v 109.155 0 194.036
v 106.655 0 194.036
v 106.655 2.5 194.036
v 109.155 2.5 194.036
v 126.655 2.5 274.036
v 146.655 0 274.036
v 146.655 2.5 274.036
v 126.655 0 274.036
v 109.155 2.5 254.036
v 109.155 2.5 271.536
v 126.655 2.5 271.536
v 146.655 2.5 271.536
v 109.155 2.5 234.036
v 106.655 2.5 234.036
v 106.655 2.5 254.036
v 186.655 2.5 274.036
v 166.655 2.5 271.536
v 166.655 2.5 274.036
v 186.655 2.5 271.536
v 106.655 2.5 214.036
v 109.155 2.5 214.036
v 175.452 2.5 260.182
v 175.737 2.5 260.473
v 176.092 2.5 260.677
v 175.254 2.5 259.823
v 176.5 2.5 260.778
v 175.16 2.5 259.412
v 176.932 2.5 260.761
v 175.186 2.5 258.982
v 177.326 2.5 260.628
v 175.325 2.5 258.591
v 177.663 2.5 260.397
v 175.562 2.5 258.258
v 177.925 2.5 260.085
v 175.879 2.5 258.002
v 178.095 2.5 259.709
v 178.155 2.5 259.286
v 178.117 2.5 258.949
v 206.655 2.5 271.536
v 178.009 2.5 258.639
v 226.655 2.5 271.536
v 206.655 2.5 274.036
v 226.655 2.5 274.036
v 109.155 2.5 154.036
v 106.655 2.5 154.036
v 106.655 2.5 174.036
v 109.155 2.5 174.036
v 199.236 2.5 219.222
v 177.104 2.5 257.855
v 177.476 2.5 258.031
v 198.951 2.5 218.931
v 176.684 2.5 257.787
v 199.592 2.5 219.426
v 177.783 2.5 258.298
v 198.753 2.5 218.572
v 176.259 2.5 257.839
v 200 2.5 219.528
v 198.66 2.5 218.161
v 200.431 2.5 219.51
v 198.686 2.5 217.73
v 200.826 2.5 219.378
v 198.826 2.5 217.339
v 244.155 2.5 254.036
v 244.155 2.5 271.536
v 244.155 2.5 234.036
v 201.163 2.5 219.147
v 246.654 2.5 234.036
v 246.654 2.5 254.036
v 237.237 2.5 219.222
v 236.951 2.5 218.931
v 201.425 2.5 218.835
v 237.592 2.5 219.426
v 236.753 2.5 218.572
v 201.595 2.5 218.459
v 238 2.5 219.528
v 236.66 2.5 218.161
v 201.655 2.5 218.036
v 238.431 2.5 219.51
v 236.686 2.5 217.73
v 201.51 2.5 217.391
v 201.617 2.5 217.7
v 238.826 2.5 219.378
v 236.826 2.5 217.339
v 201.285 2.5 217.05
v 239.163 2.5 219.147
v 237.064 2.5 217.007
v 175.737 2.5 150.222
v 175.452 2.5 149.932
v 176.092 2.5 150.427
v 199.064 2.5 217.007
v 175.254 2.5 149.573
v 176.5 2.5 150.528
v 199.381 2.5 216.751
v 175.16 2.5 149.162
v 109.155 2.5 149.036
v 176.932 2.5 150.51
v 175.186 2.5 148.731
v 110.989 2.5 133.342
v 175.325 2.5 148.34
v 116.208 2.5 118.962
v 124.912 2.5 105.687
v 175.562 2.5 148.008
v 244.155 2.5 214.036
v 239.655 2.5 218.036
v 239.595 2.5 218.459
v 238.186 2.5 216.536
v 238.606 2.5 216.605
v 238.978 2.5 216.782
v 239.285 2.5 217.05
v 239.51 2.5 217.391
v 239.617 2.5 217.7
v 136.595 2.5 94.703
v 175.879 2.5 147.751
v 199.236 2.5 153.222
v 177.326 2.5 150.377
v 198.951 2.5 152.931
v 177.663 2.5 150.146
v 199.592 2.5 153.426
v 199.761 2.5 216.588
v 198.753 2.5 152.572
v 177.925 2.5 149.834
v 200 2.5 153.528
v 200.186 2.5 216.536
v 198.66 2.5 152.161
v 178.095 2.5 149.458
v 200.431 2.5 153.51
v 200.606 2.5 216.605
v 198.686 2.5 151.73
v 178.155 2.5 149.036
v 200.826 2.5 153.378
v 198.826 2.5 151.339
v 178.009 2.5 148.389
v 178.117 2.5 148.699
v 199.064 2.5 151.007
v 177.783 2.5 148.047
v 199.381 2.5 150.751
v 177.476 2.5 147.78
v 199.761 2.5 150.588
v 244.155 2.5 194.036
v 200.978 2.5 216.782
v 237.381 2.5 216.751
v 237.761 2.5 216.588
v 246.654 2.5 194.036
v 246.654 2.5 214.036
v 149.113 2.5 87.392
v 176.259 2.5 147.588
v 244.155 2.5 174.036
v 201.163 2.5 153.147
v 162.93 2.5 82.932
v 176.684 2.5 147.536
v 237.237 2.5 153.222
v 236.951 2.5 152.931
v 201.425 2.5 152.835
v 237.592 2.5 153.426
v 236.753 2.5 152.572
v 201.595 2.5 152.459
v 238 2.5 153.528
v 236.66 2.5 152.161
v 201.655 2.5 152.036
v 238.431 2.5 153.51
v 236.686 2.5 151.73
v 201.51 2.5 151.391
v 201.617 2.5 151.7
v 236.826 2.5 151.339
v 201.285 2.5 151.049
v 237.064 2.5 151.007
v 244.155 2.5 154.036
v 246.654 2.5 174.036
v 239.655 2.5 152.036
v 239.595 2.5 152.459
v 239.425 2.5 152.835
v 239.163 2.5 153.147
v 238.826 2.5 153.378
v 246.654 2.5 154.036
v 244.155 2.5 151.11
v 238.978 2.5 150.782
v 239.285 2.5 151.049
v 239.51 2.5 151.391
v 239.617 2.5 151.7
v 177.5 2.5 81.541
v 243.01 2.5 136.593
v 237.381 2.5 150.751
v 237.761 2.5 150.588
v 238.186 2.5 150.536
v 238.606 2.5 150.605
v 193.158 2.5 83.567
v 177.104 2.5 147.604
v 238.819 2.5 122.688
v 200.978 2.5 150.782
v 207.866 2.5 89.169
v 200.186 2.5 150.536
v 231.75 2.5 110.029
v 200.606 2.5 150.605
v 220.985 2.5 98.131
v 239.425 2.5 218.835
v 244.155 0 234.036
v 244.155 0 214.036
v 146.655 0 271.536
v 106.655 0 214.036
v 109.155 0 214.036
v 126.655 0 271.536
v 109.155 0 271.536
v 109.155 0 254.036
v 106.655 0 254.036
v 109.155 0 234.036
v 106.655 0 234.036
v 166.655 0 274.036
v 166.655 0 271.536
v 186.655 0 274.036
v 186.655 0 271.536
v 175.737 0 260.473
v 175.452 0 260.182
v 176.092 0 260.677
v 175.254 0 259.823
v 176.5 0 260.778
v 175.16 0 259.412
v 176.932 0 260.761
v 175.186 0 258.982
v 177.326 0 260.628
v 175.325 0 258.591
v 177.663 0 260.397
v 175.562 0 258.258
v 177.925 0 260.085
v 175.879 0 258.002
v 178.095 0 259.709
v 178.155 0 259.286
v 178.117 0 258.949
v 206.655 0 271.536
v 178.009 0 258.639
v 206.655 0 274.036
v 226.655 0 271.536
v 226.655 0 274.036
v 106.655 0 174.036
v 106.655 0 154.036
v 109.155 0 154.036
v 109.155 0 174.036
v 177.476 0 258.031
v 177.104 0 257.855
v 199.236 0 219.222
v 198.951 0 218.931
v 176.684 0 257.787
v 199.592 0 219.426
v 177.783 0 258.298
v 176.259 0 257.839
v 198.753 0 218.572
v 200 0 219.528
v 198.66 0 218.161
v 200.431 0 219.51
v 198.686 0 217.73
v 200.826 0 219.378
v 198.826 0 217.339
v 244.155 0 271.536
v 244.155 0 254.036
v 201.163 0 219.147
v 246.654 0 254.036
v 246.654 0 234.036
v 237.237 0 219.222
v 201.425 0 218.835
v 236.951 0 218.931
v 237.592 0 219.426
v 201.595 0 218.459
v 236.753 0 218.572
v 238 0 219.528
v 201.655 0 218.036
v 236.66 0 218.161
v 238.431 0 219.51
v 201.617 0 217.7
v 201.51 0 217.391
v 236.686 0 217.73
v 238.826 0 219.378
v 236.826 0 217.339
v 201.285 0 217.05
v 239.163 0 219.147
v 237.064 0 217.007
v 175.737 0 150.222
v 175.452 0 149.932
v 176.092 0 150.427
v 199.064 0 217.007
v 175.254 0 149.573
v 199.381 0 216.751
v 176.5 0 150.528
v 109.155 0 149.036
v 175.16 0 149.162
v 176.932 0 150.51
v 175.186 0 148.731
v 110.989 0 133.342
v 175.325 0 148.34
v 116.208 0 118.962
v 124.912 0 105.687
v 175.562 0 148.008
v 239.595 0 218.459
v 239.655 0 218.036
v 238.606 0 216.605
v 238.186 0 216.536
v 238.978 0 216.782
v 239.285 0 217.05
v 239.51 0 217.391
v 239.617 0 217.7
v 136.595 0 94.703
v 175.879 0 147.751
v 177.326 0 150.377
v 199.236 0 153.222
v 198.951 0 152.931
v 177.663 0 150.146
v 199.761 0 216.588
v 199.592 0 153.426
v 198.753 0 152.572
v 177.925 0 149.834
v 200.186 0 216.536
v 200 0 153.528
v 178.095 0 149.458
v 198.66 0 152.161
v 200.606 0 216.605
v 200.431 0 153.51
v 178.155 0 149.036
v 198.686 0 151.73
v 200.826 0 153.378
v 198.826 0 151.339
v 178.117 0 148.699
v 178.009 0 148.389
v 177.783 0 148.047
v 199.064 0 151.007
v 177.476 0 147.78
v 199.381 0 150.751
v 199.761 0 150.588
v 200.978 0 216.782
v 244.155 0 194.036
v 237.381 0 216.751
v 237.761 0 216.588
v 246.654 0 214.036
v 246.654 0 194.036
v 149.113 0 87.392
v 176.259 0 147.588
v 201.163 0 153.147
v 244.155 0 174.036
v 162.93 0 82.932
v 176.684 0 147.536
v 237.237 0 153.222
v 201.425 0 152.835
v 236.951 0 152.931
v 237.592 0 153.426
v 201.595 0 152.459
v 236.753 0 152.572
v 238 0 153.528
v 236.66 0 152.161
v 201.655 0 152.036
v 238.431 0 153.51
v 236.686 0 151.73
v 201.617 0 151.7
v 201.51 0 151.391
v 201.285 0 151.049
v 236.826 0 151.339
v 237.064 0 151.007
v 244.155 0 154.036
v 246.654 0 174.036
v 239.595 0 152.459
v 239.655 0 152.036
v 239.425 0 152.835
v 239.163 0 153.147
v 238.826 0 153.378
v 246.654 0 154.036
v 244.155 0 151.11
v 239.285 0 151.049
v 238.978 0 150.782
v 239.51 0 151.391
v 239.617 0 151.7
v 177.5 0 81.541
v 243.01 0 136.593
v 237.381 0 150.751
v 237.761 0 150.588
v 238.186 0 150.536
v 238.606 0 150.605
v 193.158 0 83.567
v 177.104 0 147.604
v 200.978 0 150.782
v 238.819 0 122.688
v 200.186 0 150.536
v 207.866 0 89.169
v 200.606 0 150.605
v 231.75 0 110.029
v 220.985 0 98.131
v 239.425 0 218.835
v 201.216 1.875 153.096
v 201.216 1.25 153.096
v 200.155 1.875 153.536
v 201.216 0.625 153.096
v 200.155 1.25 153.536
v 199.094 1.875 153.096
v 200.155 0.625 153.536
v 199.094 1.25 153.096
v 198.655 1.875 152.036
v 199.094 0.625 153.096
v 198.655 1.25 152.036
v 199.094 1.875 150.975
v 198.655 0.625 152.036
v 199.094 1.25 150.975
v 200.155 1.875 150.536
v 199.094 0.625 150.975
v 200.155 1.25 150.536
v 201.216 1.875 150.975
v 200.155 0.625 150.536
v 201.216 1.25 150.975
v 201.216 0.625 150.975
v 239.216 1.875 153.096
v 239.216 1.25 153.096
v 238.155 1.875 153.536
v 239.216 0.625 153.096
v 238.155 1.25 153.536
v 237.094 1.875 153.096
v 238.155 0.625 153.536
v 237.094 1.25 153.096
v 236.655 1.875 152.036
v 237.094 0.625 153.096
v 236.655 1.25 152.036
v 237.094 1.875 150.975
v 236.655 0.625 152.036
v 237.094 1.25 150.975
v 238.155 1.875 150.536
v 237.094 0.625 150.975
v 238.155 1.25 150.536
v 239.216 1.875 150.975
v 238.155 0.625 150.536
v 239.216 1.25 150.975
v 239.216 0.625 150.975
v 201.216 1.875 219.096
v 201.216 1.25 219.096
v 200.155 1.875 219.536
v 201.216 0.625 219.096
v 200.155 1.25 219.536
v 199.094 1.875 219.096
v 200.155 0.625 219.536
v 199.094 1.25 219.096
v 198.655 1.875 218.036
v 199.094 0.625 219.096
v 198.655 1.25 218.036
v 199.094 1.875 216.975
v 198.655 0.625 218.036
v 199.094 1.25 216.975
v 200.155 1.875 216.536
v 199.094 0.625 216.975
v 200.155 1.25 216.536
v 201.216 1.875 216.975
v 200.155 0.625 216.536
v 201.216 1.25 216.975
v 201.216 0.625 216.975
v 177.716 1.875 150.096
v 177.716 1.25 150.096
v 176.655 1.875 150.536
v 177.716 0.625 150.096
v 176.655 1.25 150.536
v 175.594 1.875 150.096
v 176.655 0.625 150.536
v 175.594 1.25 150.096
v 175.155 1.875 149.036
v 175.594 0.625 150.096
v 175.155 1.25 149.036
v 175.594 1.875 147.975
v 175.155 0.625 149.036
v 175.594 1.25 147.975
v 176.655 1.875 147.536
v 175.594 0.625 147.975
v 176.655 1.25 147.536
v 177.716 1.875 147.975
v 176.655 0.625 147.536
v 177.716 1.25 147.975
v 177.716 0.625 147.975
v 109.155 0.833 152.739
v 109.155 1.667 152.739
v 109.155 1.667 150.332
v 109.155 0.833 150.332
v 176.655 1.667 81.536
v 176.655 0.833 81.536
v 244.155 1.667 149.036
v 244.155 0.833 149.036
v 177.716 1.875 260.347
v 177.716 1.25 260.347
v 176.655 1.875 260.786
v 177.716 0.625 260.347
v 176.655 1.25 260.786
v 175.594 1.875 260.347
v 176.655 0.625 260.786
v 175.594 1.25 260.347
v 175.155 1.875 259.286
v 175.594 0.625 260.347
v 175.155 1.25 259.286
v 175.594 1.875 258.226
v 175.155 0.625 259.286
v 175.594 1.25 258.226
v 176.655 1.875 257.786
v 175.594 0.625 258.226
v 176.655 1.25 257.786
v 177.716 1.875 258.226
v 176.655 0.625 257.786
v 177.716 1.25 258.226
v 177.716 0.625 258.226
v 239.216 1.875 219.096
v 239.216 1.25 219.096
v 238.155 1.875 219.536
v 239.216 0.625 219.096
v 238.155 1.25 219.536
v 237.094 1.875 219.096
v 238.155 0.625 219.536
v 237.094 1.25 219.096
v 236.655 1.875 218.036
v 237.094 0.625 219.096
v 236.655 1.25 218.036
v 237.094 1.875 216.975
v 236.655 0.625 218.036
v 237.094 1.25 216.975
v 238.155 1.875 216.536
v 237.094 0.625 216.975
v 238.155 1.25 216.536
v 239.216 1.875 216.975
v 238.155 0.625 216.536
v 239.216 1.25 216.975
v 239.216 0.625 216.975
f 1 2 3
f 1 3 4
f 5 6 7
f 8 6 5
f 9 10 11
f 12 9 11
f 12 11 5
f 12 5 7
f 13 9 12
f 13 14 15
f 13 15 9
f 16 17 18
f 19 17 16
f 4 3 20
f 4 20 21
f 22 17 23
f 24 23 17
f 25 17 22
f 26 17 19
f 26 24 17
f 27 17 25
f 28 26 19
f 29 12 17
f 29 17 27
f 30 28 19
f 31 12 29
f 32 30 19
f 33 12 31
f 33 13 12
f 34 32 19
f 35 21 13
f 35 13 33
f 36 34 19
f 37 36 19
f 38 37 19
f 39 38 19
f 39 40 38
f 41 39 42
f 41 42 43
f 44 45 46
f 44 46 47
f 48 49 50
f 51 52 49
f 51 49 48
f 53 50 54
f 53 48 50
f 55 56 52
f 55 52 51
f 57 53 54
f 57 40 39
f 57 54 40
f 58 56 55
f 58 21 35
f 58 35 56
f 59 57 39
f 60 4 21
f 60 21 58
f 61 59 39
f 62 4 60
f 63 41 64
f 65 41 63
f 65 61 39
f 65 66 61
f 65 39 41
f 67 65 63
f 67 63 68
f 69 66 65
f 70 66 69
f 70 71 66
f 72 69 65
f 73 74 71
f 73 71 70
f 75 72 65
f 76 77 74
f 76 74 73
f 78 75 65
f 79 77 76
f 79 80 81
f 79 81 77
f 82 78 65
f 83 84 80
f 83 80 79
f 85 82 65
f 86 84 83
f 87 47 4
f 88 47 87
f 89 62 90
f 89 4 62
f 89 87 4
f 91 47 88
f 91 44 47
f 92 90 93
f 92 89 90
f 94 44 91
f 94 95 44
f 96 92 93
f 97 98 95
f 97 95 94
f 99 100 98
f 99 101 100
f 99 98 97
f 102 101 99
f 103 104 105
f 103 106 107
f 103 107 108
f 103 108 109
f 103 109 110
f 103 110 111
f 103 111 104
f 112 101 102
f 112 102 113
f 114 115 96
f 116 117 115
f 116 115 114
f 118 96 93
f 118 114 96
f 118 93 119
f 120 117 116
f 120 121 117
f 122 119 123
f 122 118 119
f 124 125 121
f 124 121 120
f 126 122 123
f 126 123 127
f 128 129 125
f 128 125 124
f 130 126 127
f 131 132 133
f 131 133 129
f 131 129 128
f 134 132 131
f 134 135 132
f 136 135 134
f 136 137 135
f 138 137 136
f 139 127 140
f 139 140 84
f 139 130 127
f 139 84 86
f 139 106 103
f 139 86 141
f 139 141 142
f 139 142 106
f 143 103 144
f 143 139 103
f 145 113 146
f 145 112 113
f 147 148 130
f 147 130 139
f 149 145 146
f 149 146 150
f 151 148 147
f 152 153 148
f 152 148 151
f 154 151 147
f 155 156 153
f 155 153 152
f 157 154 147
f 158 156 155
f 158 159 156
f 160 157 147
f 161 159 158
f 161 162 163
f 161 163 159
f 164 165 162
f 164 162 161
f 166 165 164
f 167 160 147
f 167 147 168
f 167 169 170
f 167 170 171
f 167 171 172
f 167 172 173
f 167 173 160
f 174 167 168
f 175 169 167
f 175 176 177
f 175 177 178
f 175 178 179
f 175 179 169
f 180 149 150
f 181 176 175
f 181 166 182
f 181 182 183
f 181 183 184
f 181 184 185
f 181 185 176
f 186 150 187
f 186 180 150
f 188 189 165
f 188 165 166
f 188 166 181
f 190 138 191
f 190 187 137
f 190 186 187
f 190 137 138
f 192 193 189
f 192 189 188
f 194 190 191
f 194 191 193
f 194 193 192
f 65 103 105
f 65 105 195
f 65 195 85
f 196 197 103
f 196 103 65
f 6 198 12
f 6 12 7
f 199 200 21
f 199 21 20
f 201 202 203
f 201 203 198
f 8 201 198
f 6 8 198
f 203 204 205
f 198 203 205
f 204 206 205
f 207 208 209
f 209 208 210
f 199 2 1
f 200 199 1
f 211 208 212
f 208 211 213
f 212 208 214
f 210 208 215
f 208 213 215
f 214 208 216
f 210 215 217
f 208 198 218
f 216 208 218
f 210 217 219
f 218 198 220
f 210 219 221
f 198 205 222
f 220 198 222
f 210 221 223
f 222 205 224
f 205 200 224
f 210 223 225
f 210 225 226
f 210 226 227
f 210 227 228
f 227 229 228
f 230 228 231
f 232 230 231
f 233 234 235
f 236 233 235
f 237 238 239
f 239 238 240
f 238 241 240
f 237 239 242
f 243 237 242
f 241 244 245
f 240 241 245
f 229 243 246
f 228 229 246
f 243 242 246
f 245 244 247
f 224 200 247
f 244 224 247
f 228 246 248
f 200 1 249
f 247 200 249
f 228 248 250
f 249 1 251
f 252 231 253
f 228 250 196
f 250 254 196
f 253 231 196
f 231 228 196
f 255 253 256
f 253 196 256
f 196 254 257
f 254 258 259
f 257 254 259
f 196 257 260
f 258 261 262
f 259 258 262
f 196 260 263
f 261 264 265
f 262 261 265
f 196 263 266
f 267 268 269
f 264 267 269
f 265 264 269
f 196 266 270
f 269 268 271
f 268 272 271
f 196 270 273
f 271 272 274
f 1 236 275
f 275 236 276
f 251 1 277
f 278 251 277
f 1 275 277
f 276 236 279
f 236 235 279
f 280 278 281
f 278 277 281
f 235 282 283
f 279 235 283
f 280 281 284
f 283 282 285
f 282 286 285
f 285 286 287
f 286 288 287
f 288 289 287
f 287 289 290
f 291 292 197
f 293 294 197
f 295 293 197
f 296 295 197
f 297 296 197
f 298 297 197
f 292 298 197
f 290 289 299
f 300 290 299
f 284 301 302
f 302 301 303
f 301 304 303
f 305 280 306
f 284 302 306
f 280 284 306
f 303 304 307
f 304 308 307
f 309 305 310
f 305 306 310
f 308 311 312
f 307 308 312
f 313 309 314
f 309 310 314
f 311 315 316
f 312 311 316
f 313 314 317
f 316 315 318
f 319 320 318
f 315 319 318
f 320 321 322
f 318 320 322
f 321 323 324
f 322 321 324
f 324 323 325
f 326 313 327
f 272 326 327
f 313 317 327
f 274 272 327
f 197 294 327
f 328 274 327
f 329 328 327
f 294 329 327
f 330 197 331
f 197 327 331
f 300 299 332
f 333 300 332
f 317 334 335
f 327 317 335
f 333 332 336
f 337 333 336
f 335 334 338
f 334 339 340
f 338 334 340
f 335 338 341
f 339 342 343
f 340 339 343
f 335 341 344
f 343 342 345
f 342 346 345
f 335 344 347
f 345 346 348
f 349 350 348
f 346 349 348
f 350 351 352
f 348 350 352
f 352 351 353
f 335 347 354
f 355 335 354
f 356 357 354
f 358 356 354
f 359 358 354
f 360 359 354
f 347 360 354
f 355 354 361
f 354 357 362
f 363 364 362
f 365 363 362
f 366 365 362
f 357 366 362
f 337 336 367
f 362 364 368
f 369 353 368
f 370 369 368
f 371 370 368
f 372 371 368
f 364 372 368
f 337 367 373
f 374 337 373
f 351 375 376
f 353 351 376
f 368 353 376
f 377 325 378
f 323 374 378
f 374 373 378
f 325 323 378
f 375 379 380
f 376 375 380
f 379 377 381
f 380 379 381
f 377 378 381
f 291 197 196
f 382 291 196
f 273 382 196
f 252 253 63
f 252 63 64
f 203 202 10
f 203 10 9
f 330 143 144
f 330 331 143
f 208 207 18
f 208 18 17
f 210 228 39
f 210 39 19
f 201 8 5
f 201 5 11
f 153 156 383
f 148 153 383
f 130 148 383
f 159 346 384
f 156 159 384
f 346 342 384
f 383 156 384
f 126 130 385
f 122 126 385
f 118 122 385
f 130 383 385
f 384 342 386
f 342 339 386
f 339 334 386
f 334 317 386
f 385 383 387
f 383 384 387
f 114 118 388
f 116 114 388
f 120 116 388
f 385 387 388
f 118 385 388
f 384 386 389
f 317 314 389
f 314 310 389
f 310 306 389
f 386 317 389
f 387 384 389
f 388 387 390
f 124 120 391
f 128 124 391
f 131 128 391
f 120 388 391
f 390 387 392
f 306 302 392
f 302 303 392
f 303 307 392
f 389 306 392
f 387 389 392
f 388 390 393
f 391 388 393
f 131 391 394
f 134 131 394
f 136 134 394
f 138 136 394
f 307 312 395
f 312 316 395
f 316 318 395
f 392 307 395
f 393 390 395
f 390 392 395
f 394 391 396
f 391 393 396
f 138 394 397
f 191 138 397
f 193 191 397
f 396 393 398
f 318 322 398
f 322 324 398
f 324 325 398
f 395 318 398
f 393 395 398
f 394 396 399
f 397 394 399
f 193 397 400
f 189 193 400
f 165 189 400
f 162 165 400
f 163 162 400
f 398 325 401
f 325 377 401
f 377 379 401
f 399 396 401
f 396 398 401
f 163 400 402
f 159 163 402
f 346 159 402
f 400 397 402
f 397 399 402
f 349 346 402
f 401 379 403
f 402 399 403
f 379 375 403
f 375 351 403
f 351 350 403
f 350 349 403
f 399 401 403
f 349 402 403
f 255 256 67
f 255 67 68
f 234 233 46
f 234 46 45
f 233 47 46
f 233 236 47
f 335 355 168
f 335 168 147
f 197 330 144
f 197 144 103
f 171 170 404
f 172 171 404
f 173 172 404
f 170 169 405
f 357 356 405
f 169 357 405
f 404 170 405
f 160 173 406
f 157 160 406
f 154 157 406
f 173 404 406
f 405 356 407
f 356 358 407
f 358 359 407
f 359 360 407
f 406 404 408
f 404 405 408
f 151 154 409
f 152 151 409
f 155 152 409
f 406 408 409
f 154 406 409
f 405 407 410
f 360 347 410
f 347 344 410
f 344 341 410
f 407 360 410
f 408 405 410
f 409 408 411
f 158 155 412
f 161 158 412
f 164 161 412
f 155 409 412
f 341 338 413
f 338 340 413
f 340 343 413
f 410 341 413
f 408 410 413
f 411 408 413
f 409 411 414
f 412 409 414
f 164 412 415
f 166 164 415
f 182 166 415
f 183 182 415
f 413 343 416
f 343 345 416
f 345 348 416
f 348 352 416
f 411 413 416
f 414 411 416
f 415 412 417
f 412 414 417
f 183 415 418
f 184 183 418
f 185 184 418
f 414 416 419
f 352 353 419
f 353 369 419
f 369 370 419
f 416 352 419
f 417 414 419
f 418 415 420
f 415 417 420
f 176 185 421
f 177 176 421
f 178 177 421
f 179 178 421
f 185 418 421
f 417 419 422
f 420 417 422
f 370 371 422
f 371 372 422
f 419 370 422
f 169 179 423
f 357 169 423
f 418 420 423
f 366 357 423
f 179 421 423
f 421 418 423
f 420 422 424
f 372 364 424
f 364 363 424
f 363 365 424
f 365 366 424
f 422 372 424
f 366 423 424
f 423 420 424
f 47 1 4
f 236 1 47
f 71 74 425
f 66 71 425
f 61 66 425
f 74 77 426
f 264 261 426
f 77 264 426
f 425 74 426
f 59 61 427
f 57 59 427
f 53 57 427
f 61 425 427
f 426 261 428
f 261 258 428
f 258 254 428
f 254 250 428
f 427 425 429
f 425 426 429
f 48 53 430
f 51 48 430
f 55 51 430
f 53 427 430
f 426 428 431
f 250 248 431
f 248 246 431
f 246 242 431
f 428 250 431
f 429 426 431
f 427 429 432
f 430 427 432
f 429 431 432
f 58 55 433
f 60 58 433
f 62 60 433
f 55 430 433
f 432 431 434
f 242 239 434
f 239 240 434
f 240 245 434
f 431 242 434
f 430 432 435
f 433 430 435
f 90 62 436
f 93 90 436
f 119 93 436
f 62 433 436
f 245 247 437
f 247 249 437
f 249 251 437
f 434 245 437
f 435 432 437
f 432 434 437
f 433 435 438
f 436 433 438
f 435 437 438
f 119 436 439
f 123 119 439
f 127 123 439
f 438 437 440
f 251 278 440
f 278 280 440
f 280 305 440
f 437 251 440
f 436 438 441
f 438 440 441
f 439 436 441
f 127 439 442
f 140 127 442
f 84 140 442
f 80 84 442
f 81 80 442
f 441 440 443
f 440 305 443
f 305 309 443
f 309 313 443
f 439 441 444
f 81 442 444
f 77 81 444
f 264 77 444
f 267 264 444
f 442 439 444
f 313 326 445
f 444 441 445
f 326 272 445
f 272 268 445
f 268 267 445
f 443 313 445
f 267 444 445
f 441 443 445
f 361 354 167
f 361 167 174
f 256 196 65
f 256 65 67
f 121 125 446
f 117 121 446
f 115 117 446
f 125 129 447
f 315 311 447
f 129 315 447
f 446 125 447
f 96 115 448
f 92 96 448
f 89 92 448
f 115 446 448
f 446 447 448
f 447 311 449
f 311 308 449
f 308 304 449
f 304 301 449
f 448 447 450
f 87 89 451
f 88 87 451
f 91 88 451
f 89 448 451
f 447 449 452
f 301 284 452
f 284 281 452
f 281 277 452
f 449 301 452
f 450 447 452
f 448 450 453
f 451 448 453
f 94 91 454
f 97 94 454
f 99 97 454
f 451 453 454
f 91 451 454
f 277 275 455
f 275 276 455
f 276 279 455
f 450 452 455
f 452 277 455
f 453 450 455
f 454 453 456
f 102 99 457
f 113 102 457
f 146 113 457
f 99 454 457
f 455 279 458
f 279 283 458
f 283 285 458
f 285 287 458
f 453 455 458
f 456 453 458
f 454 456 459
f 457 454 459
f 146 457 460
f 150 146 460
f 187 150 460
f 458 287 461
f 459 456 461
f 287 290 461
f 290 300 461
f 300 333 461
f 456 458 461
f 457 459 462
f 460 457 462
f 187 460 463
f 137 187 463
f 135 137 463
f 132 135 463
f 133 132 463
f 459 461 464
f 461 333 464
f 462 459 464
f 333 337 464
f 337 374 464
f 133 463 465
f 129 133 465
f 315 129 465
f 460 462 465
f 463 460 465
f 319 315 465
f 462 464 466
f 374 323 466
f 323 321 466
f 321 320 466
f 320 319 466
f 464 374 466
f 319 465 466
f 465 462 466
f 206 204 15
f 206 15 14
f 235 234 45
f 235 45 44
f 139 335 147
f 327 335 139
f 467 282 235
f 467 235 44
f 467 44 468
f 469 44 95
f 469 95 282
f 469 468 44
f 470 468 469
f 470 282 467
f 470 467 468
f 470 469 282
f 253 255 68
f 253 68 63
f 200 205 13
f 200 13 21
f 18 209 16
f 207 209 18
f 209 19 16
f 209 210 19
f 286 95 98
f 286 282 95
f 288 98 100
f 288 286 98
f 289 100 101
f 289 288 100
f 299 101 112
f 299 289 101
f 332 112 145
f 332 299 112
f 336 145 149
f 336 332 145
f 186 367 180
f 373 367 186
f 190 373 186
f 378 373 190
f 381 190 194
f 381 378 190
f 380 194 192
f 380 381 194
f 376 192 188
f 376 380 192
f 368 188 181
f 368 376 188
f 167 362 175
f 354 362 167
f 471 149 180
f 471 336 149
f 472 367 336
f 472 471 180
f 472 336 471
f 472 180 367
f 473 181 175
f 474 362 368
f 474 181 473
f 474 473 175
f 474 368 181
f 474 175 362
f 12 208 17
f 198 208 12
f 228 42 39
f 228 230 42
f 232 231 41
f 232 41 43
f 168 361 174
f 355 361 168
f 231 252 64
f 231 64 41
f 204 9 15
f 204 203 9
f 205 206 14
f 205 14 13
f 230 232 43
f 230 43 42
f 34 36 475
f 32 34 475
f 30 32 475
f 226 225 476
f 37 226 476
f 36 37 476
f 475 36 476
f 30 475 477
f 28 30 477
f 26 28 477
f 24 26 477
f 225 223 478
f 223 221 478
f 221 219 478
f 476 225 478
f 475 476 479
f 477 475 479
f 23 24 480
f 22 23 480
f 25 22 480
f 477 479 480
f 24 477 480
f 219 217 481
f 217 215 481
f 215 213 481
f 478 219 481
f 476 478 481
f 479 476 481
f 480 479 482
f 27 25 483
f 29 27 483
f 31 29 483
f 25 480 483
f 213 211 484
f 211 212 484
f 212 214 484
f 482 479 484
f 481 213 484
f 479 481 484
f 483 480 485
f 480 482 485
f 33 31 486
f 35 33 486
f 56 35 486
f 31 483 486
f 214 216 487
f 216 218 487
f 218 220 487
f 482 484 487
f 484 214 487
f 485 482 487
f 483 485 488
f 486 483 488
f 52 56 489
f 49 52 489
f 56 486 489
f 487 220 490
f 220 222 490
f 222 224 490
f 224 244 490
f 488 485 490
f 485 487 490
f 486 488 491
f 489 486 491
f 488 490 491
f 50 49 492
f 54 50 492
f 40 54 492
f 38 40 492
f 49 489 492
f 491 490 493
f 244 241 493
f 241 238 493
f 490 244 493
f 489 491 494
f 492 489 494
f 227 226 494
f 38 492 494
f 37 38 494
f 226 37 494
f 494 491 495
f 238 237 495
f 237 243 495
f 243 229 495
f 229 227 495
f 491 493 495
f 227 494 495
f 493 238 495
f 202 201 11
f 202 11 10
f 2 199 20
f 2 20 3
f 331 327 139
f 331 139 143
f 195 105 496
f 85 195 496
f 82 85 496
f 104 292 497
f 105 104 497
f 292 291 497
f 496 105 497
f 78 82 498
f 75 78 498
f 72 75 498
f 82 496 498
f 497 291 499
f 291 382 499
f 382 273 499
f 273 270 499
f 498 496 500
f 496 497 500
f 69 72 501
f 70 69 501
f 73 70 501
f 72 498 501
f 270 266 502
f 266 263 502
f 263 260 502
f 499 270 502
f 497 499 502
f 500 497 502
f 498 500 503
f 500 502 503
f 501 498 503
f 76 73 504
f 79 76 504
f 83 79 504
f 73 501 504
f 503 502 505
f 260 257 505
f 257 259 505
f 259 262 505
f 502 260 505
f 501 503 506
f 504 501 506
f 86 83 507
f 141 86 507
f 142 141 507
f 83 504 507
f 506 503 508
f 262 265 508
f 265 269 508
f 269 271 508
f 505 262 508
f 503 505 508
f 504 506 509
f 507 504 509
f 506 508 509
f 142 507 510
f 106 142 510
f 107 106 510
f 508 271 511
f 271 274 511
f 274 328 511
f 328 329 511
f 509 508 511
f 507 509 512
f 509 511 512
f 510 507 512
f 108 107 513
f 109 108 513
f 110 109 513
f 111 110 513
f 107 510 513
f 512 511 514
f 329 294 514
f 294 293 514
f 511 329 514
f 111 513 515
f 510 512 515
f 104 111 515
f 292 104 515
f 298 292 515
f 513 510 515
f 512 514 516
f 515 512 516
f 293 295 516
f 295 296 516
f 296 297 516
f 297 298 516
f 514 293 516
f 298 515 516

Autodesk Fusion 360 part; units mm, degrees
sketch "スケッチ1" plane through (0, 0, 0) normal (0, 1, 0) x (1, 0, 0)
  spline S0 degree 3 poles (239.6551, -218.0358) (239.6551, -218.8643) (238.9837, -219.5358) (238.1551, -219.5358) (237.3266, -219.5358) (236.6548, -218.8643) (236.6548, -218.0358) (236.6548, -217.2076) (237.3266, -216.5358) (238.1551, -216.5358) (238.9837, -216.5358) (239.6551, -217.2076) (239.6551, -218.0358) knots 0 0 0 0 1 1 1 2 2 2 3 3 3 4 4 4 4
  line L0 (109.155, -271.5357) -> (109.155, -254.0357)
  line L1 (109.155, -254.0357) -> (106.6552, -254.0357)
  line L2 (106.6552, -254.0357) -> (106.6552, -234.0358)
  line L3 (106.6552, -234.0358) -> (109.155, -234.0358)
  line L4 (109.155, -234.0358) -> (109.155, -214.036)
  line L5 (109.155, -214.036) -> (106.6552, -214.036)
  line L6 (106.6552, -214.036) -> (106.6552, -194.0358)
  line L7 (106.6552, -194.0358) -> (109.155, -194.0358)
  line L8 (109.155, -194.0358) -> (109.155, -174.0357)
  line L9 (109.155, -174.0357) -> (106.6552, -174.0357)
  line L10 (106.6552, -174.0357) -> (106.6547, -154.0357)
  line L11 (106.6547, -154.0357) -> (109.1548, -154.0357)
  spline S1 degree 3 poles (109.1548, -154.0357) (109.1548, -154.0356) (109.1548, -149.0358) (109.155, -149.0356) knots 12 12 12 12 13 13 13 13
  spline S2 degree 3 poles (109.155, -149.0356) (109.155, -111.7564) (139.3757, -81.5356) (176.655, -81.5356) (213.9344, -81.5356) (244.1548, -111.7564) (244.1548, -149.0356) (244.1548, -149.0358) (244.1548, -154.0356) (244.1548, -154.0357) knots 13 13 13 13 14 14 14 15 15 15 16 16 16 16
  line L12 (244.1548, -154.0357) -> (246.6545, -154.0357)
  line L13 (246.6545, -154.0357) -> (246.6545, -174.0357)
  line L14 (246.6545, -174.0357) -> (244.1548, -174.0357)
  line L15 (244.1548, -174.0357) -> (244.1548, -194.0358)
  line L16 (244.1548, -194.0358) -> (246.6545, -194.0358)
  line L17 (246.6545, -194.0358) -> (246.6545, -214.036)
  line L18 (246.6545, -214.036) -> (244.1548, -214.036)
  line L19 (244.1548, -214.036) -> (244.1548, -234.0358)
  line L20 (244.1548, -234.0358) -> (246.6545, -234.0358)
  line L21 (246.6545, -234.0358) -> (246.6545, -254.0357)
  line L22 (246.6545, -254.0357) -> (244.1548, -254.0357)
  line L23 (244.1548, -254.0357) -> (244.1548, -271.5357)
  line L24 (244.1548, -271.5357) -> (226.6547, -271.5357)
  line L25 (226.6547, -271.5357) -> (226.6547, -274.0358)
  line L26 (226.6547, -274.0358) -> (206.6549, -274.0358)
  line L27 (206.6549, -274.0358) -> (206.6549, -271.5357)
  line L28 (206.6549, -271.5357) -> (186.6547, -271.5357)
  line L29 (186.6547, -271.5357) -> (186.6547, -274.0358)
  line L30 (186.6547, -274.0358) -> (166.6547, -274.0358)
  line L31 (166.6547, -274.0358) -> (166.6547, -271.5357)
  line L32 (166.6547, -271.5357) -> (146.6547, -271.5357)
  line L33 (146.6547, -271.5357) -> (146.6547, -274.0358)
  line L34 (146.6547, -274.0358) -> (126.6547, -274.0358)
  line L35 (126.6547, -274.0358) -> (126.6547, -271.5357)
  line L36 (126.6547, -271.5357) -> (109.155, -271.5357)
  spline S3 degree 3 poles (178.155, -149.0356) (178.155, -149.864) (177.4832, -150.5356) (176.6548, -150.5356) (175.8264, -150.5356) (175.1548, -149.864) (175.1548, -149.0356) (175.1548, -148.2072) (175.8264, -147.5356) (176.6548, -147.5356) (177.4832, -147.5356) (178.155, -148.2072) (178.155, -149.0356) knots 0 0 0 0 1 1 1 2 2 2 3 3 3 4 4 4 4
  spline S4 degree 3 poles (178.155, -259.2863) (178.155, -260.1145) (177.4832, -260.7863) (176.6548, -260.7863) (175.8264, -260.7863) (175.1548, -260.1145) (175.1548, -259.2863) (175.1548, -258.4581) (175.8264, -257.7863) (176.6548, -257.7863) (177.4832, -257.7863) (178.155, -258.4581) (178.155, -259.2863) knots 0 0 0 0 1 1 1 2 2 2 3 3 3 4 4 4 4
  spline S5 degree 3 poles (201.655, -152.0358) (201.655, -152.8642) (200.9836, -153.5356) (200.155, -153.5356) (199.3265, -153.5356) (198.6547, -152.8642) (198.6547, -152.0358) (198.6547, -151.2074) (199.3265, -150.5356) (200.155, -150.5356) (200.9836, -150.5356) (201.655, -151.2074) (201.655, -152.0358) knots 0 0 0 0 1 1 1 2 2 2 3 3 3 4 4 4 4
  spline S6 degree 3 poles (201.655, -218.0358) (201.655, -218.8643) (200.9836, -219.5358) (200.155, -219.5358) (199.3265, -219.5358) (198.6547, -218.8643) (198.6547, -218.0358) (198.6547, -217.2076) (199.3265, -216.5358) (200.155, -216.5358) (200.9836, -216.5358) (201.655, -217.2076) (201.655, -218.0358) knots 0 0 0 0 1 1 1 2 2 2 3 3 3 4 4 4 4
  spline S7 degree 3 poles (239.6551, -152.0358) (239.6551, -152.8642) (238.9837, -153.5356) (238.1551, -153.5356) (237.3266, -153.5356) (236.6548, -152.8642) (236.6548, -152.0358) (236.6548, -151.2074) (237.3266, -150.5356) (238.1551, -150.5356) (238.9837, -150.5356) (239.6551, -151.2074) (239.6551, -152.0358) knots 0 0 0 0 1 1 1 2 2 2 3 3 3 4 4 4 4
extrude "押し出し1" add sketch "スケッチ1" along normal blind 2.5
